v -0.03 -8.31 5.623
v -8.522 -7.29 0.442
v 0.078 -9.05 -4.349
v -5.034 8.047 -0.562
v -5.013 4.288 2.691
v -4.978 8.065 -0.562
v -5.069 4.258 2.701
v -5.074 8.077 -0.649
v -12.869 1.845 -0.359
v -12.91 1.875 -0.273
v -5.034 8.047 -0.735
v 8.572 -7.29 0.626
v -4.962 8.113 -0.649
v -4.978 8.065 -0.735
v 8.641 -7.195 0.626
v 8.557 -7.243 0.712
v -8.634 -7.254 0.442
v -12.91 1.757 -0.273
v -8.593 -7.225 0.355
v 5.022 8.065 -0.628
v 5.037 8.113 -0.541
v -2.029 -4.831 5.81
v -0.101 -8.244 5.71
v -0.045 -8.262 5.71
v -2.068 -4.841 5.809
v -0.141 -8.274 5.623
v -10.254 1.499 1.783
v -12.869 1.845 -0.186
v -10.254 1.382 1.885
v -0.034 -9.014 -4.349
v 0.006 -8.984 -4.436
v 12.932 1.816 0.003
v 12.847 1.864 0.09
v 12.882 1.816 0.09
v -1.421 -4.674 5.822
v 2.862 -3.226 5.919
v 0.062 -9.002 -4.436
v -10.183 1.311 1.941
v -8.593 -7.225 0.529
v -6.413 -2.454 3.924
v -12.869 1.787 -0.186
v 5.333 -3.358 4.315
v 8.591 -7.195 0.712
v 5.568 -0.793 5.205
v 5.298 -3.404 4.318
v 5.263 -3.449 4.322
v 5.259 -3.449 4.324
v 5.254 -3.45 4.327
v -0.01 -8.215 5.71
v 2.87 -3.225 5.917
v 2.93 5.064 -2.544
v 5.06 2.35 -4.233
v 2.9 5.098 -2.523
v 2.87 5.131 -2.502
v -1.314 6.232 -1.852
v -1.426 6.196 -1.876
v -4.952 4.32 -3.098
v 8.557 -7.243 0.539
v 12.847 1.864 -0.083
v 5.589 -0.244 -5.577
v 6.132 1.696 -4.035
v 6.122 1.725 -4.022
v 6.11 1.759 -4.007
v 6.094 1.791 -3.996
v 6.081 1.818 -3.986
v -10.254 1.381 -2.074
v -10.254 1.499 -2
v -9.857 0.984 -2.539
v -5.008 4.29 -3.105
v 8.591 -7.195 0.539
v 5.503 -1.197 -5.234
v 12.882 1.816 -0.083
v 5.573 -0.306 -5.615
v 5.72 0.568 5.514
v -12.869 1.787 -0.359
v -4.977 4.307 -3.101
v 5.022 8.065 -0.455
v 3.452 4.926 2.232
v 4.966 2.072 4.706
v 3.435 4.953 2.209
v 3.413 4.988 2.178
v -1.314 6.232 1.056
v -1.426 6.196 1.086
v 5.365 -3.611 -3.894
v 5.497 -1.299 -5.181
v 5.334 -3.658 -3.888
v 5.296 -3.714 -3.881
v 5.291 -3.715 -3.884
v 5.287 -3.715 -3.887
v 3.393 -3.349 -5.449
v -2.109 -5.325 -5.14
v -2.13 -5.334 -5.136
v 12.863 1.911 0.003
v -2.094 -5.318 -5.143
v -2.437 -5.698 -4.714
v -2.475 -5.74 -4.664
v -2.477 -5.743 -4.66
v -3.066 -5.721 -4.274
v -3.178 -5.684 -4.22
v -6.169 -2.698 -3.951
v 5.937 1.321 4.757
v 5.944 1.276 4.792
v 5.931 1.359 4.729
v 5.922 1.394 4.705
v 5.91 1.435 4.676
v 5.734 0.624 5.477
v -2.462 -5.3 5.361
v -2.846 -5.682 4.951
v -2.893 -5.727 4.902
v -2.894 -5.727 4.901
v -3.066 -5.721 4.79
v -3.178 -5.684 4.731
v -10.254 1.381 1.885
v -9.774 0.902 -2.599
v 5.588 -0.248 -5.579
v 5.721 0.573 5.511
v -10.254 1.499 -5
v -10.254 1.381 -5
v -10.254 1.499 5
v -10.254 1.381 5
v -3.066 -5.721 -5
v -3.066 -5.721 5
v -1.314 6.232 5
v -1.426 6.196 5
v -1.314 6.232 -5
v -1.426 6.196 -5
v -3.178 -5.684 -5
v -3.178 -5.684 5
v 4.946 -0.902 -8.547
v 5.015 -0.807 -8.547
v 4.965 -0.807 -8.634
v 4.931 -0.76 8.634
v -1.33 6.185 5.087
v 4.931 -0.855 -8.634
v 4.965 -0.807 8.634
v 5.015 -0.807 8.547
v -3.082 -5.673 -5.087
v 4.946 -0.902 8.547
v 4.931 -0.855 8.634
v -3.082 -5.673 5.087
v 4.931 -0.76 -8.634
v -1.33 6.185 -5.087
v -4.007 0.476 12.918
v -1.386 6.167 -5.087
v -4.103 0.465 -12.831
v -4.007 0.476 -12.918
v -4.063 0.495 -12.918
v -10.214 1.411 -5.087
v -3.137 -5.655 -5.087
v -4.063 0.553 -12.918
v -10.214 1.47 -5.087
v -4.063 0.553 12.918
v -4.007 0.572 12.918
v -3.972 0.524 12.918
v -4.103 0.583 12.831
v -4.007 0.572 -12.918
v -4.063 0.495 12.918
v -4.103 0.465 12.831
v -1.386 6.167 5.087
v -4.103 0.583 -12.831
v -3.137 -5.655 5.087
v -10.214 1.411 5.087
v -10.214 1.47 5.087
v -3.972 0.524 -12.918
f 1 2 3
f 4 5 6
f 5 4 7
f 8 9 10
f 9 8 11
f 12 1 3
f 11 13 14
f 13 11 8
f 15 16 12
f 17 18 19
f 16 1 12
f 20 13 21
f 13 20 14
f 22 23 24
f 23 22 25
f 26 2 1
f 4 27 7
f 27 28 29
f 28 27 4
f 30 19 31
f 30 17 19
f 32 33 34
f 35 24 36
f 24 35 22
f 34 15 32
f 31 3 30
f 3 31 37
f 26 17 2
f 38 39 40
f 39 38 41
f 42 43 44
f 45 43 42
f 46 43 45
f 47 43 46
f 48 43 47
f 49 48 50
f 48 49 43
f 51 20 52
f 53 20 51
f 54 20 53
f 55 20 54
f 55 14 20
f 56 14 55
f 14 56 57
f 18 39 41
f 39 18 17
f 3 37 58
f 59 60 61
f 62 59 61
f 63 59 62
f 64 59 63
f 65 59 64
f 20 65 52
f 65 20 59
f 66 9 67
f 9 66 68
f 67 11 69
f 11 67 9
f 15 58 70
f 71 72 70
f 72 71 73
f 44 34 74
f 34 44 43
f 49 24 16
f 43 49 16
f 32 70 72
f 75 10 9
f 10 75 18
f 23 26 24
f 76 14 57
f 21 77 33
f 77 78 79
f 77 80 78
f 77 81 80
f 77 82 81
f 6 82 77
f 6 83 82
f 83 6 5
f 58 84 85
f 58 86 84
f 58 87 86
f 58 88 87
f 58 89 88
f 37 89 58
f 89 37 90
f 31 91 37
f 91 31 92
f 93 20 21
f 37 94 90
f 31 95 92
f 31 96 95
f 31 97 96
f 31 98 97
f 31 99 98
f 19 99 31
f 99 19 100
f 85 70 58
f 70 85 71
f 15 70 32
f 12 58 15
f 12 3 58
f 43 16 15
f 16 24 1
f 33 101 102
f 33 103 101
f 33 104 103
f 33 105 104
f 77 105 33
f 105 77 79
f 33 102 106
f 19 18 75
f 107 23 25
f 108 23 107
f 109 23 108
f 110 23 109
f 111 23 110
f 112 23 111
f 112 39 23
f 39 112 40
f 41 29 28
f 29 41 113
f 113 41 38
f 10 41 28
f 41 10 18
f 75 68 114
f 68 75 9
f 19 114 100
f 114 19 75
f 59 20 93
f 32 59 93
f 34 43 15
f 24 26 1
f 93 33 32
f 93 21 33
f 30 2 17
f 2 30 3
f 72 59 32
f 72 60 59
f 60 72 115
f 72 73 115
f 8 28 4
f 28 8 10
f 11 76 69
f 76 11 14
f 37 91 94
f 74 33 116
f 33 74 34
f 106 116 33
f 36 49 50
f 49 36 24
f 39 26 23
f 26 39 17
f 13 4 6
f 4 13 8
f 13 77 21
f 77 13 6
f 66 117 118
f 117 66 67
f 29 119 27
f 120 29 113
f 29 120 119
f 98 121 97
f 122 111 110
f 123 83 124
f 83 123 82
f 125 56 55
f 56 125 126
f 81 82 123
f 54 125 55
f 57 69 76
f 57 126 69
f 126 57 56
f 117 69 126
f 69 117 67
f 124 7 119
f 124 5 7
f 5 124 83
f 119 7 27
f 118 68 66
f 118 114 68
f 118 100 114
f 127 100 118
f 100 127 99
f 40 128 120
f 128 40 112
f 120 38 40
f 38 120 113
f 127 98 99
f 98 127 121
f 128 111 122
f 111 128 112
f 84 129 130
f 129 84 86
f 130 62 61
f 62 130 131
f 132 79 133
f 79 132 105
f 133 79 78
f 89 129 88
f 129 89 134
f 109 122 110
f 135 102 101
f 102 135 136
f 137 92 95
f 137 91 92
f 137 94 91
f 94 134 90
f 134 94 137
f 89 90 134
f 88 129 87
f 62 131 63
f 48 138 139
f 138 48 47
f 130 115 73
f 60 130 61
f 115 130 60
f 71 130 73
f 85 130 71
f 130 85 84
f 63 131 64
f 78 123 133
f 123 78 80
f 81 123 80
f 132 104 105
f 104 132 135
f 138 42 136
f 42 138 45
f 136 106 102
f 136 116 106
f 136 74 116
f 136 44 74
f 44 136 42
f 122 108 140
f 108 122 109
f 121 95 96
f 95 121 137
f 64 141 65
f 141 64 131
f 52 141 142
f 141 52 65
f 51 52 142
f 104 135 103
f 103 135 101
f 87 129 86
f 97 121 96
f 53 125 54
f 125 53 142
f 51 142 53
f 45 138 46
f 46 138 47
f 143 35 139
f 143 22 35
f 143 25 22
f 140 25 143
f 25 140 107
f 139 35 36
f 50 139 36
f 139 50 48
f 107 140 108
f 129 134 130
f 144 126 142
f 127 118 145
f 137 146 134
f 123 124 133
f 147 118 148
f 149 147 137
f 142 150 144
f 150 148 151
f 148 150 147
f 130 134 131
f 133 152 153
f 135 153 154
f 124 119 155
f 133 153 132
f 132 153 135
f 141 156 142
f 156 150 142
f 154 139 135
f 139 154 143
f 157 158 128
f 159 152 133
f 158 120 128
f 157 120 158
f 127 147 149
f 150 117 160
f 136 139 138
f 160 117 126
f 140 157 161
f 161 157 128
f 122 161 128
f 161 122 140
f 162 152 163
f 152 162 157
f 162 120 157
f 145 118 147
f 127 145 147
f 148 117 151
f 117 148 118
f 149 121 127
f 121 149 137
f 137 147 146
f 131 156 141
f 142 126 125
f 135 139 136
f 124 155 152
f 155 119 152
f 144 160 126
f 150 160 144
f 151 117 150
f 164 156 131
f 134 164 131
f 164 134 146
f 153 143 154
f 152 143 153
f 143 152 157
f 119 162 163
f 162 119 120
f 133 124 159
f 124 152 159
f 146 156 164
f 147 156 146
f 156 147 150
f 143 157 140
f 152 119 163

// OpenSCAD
// Auto-generated OpenSCAD file

    inner_points = 10*[[-0.13450932832646978, 0.6137208793216535, -0.49999999999996475], [-0.30970268855061545, -0.5625709645316335, -0.5000000000000352], [-0.13450932832643542, 0.6137208793215885, 0.5000000000000352], [-0.3097026885505811, -0.5625709645316985, 0.49999999999996475], [-0.4022234175933843, 0.052401101187175045, -1.283102338831261], [-0.40222341759329616, 0.05240110118700812, 1.283102338831277], [0.4915267827134717, -0.08071135862540943, -0.8547430824889966], [0.49152678271353045, -0.08071135862552062, 0.8547430824889337], [-1.017331462216076, 0.14401343855176083, -0.499999999999965], [-1.0173314622160416, 0.1440134385516957, 0.500000000000035], [0.7029977653621209, 0.39330793047033674, -7.860303774857193e-15], [0.555685674258319, -0.5957821300472206, -6.713421756971425e-14]];

    outer_points = 10*[[-0.4935961942844095, -0.04399878007182188, -0.5983441385906083], [-0.5063460204819994, 0.04399878007182188, 0.5875939233346719], [0.5063460204819994, -0.04399878007182188, -0.5875939233346719], [0.4935961942844095, 0.04399878007182188, 0.5983441385906083], [-1.2828833411617955, 0.18160496168964152, -0.027267303587311748], [1.283173047764001, 0.18160496168964152, 0.00031994908835159333], [-0.8552676058642261, -0.7195265371946491, 0.04419460685783971], [0.8541197760563402, -0.7195265371946491, 0.06257195110839778], [-0.49933157435504716, 0.8017930567931236, -0.06486192322812147], [0.5006106404113617, 0.8017930567931236, -0.05411170797218501], [0.004675625240909675, -0.8954762230599844, -0.43490804114188575], [-0.006045121001836061, -0.8214830958078585, 0.5622930833658284]];

    // Convex hull for inner set (I)
    module inner_hull() {
        hull() {
            for (p = inner_points) {
                translate(p) sphere(r=0.1);
            }
        }
    }

    // Convex hull for outer set (O) minus inner hull (O \ I)
    module outer_minus_inner() {
        difference() {
            hull() {
                for (p = outer_points) {
                    translate(p) sphere(r=0.1);
                }
            }
            inner_hull(); // Subtract inner hull
        }
    }

    // Convex hull for outer set (O) minus all translated inner hulls
    module outer_minus_AllTranslationInner() {
        difference() {
            hull() {
                for (p = outer_points) {
                    translate(p) sphere(r=0.1);
                }
            }
            hull() {
                translate([0,0,50]) inner_hull();
                translate([0,0,-50]) inner_hull();
            }; // Subtract translated inner hulls
        }
    }

    // Difference between outer_minus_inner and outer_minus_AllTranslationInner
    module outer_minus_inner_diff() {
        difference() {
            // Outer minus inner
            difference() {
                hull() {
                    for (p = outer_points) {
                        translate(p) sphere(r=0.1);
                    }
                }
                inner_hull();
            }

            // Subtract Outer minus AllTranslationInner
            difference() {
                hull() {
                    for (p = outer_points) {
                        translate(p) sphere(r=0.1);
                    }
                }
                hull() {
                    translate([0,0,50]) inner_hull();
                    translate([0,0,-50]) inner_hull();
                };
            }
        }
    }

    // Rendering all with colors applied
    color([1, 0, 0, 0.5]) inner_hull(); // Transparent red
    color([0, 1, 0, 1]) outer_minus_AllTranslationInner(); // Opaque green
    color([1, 1, 0, 1]) outer_minus_inner_diff(); // Opaque yellow
    
